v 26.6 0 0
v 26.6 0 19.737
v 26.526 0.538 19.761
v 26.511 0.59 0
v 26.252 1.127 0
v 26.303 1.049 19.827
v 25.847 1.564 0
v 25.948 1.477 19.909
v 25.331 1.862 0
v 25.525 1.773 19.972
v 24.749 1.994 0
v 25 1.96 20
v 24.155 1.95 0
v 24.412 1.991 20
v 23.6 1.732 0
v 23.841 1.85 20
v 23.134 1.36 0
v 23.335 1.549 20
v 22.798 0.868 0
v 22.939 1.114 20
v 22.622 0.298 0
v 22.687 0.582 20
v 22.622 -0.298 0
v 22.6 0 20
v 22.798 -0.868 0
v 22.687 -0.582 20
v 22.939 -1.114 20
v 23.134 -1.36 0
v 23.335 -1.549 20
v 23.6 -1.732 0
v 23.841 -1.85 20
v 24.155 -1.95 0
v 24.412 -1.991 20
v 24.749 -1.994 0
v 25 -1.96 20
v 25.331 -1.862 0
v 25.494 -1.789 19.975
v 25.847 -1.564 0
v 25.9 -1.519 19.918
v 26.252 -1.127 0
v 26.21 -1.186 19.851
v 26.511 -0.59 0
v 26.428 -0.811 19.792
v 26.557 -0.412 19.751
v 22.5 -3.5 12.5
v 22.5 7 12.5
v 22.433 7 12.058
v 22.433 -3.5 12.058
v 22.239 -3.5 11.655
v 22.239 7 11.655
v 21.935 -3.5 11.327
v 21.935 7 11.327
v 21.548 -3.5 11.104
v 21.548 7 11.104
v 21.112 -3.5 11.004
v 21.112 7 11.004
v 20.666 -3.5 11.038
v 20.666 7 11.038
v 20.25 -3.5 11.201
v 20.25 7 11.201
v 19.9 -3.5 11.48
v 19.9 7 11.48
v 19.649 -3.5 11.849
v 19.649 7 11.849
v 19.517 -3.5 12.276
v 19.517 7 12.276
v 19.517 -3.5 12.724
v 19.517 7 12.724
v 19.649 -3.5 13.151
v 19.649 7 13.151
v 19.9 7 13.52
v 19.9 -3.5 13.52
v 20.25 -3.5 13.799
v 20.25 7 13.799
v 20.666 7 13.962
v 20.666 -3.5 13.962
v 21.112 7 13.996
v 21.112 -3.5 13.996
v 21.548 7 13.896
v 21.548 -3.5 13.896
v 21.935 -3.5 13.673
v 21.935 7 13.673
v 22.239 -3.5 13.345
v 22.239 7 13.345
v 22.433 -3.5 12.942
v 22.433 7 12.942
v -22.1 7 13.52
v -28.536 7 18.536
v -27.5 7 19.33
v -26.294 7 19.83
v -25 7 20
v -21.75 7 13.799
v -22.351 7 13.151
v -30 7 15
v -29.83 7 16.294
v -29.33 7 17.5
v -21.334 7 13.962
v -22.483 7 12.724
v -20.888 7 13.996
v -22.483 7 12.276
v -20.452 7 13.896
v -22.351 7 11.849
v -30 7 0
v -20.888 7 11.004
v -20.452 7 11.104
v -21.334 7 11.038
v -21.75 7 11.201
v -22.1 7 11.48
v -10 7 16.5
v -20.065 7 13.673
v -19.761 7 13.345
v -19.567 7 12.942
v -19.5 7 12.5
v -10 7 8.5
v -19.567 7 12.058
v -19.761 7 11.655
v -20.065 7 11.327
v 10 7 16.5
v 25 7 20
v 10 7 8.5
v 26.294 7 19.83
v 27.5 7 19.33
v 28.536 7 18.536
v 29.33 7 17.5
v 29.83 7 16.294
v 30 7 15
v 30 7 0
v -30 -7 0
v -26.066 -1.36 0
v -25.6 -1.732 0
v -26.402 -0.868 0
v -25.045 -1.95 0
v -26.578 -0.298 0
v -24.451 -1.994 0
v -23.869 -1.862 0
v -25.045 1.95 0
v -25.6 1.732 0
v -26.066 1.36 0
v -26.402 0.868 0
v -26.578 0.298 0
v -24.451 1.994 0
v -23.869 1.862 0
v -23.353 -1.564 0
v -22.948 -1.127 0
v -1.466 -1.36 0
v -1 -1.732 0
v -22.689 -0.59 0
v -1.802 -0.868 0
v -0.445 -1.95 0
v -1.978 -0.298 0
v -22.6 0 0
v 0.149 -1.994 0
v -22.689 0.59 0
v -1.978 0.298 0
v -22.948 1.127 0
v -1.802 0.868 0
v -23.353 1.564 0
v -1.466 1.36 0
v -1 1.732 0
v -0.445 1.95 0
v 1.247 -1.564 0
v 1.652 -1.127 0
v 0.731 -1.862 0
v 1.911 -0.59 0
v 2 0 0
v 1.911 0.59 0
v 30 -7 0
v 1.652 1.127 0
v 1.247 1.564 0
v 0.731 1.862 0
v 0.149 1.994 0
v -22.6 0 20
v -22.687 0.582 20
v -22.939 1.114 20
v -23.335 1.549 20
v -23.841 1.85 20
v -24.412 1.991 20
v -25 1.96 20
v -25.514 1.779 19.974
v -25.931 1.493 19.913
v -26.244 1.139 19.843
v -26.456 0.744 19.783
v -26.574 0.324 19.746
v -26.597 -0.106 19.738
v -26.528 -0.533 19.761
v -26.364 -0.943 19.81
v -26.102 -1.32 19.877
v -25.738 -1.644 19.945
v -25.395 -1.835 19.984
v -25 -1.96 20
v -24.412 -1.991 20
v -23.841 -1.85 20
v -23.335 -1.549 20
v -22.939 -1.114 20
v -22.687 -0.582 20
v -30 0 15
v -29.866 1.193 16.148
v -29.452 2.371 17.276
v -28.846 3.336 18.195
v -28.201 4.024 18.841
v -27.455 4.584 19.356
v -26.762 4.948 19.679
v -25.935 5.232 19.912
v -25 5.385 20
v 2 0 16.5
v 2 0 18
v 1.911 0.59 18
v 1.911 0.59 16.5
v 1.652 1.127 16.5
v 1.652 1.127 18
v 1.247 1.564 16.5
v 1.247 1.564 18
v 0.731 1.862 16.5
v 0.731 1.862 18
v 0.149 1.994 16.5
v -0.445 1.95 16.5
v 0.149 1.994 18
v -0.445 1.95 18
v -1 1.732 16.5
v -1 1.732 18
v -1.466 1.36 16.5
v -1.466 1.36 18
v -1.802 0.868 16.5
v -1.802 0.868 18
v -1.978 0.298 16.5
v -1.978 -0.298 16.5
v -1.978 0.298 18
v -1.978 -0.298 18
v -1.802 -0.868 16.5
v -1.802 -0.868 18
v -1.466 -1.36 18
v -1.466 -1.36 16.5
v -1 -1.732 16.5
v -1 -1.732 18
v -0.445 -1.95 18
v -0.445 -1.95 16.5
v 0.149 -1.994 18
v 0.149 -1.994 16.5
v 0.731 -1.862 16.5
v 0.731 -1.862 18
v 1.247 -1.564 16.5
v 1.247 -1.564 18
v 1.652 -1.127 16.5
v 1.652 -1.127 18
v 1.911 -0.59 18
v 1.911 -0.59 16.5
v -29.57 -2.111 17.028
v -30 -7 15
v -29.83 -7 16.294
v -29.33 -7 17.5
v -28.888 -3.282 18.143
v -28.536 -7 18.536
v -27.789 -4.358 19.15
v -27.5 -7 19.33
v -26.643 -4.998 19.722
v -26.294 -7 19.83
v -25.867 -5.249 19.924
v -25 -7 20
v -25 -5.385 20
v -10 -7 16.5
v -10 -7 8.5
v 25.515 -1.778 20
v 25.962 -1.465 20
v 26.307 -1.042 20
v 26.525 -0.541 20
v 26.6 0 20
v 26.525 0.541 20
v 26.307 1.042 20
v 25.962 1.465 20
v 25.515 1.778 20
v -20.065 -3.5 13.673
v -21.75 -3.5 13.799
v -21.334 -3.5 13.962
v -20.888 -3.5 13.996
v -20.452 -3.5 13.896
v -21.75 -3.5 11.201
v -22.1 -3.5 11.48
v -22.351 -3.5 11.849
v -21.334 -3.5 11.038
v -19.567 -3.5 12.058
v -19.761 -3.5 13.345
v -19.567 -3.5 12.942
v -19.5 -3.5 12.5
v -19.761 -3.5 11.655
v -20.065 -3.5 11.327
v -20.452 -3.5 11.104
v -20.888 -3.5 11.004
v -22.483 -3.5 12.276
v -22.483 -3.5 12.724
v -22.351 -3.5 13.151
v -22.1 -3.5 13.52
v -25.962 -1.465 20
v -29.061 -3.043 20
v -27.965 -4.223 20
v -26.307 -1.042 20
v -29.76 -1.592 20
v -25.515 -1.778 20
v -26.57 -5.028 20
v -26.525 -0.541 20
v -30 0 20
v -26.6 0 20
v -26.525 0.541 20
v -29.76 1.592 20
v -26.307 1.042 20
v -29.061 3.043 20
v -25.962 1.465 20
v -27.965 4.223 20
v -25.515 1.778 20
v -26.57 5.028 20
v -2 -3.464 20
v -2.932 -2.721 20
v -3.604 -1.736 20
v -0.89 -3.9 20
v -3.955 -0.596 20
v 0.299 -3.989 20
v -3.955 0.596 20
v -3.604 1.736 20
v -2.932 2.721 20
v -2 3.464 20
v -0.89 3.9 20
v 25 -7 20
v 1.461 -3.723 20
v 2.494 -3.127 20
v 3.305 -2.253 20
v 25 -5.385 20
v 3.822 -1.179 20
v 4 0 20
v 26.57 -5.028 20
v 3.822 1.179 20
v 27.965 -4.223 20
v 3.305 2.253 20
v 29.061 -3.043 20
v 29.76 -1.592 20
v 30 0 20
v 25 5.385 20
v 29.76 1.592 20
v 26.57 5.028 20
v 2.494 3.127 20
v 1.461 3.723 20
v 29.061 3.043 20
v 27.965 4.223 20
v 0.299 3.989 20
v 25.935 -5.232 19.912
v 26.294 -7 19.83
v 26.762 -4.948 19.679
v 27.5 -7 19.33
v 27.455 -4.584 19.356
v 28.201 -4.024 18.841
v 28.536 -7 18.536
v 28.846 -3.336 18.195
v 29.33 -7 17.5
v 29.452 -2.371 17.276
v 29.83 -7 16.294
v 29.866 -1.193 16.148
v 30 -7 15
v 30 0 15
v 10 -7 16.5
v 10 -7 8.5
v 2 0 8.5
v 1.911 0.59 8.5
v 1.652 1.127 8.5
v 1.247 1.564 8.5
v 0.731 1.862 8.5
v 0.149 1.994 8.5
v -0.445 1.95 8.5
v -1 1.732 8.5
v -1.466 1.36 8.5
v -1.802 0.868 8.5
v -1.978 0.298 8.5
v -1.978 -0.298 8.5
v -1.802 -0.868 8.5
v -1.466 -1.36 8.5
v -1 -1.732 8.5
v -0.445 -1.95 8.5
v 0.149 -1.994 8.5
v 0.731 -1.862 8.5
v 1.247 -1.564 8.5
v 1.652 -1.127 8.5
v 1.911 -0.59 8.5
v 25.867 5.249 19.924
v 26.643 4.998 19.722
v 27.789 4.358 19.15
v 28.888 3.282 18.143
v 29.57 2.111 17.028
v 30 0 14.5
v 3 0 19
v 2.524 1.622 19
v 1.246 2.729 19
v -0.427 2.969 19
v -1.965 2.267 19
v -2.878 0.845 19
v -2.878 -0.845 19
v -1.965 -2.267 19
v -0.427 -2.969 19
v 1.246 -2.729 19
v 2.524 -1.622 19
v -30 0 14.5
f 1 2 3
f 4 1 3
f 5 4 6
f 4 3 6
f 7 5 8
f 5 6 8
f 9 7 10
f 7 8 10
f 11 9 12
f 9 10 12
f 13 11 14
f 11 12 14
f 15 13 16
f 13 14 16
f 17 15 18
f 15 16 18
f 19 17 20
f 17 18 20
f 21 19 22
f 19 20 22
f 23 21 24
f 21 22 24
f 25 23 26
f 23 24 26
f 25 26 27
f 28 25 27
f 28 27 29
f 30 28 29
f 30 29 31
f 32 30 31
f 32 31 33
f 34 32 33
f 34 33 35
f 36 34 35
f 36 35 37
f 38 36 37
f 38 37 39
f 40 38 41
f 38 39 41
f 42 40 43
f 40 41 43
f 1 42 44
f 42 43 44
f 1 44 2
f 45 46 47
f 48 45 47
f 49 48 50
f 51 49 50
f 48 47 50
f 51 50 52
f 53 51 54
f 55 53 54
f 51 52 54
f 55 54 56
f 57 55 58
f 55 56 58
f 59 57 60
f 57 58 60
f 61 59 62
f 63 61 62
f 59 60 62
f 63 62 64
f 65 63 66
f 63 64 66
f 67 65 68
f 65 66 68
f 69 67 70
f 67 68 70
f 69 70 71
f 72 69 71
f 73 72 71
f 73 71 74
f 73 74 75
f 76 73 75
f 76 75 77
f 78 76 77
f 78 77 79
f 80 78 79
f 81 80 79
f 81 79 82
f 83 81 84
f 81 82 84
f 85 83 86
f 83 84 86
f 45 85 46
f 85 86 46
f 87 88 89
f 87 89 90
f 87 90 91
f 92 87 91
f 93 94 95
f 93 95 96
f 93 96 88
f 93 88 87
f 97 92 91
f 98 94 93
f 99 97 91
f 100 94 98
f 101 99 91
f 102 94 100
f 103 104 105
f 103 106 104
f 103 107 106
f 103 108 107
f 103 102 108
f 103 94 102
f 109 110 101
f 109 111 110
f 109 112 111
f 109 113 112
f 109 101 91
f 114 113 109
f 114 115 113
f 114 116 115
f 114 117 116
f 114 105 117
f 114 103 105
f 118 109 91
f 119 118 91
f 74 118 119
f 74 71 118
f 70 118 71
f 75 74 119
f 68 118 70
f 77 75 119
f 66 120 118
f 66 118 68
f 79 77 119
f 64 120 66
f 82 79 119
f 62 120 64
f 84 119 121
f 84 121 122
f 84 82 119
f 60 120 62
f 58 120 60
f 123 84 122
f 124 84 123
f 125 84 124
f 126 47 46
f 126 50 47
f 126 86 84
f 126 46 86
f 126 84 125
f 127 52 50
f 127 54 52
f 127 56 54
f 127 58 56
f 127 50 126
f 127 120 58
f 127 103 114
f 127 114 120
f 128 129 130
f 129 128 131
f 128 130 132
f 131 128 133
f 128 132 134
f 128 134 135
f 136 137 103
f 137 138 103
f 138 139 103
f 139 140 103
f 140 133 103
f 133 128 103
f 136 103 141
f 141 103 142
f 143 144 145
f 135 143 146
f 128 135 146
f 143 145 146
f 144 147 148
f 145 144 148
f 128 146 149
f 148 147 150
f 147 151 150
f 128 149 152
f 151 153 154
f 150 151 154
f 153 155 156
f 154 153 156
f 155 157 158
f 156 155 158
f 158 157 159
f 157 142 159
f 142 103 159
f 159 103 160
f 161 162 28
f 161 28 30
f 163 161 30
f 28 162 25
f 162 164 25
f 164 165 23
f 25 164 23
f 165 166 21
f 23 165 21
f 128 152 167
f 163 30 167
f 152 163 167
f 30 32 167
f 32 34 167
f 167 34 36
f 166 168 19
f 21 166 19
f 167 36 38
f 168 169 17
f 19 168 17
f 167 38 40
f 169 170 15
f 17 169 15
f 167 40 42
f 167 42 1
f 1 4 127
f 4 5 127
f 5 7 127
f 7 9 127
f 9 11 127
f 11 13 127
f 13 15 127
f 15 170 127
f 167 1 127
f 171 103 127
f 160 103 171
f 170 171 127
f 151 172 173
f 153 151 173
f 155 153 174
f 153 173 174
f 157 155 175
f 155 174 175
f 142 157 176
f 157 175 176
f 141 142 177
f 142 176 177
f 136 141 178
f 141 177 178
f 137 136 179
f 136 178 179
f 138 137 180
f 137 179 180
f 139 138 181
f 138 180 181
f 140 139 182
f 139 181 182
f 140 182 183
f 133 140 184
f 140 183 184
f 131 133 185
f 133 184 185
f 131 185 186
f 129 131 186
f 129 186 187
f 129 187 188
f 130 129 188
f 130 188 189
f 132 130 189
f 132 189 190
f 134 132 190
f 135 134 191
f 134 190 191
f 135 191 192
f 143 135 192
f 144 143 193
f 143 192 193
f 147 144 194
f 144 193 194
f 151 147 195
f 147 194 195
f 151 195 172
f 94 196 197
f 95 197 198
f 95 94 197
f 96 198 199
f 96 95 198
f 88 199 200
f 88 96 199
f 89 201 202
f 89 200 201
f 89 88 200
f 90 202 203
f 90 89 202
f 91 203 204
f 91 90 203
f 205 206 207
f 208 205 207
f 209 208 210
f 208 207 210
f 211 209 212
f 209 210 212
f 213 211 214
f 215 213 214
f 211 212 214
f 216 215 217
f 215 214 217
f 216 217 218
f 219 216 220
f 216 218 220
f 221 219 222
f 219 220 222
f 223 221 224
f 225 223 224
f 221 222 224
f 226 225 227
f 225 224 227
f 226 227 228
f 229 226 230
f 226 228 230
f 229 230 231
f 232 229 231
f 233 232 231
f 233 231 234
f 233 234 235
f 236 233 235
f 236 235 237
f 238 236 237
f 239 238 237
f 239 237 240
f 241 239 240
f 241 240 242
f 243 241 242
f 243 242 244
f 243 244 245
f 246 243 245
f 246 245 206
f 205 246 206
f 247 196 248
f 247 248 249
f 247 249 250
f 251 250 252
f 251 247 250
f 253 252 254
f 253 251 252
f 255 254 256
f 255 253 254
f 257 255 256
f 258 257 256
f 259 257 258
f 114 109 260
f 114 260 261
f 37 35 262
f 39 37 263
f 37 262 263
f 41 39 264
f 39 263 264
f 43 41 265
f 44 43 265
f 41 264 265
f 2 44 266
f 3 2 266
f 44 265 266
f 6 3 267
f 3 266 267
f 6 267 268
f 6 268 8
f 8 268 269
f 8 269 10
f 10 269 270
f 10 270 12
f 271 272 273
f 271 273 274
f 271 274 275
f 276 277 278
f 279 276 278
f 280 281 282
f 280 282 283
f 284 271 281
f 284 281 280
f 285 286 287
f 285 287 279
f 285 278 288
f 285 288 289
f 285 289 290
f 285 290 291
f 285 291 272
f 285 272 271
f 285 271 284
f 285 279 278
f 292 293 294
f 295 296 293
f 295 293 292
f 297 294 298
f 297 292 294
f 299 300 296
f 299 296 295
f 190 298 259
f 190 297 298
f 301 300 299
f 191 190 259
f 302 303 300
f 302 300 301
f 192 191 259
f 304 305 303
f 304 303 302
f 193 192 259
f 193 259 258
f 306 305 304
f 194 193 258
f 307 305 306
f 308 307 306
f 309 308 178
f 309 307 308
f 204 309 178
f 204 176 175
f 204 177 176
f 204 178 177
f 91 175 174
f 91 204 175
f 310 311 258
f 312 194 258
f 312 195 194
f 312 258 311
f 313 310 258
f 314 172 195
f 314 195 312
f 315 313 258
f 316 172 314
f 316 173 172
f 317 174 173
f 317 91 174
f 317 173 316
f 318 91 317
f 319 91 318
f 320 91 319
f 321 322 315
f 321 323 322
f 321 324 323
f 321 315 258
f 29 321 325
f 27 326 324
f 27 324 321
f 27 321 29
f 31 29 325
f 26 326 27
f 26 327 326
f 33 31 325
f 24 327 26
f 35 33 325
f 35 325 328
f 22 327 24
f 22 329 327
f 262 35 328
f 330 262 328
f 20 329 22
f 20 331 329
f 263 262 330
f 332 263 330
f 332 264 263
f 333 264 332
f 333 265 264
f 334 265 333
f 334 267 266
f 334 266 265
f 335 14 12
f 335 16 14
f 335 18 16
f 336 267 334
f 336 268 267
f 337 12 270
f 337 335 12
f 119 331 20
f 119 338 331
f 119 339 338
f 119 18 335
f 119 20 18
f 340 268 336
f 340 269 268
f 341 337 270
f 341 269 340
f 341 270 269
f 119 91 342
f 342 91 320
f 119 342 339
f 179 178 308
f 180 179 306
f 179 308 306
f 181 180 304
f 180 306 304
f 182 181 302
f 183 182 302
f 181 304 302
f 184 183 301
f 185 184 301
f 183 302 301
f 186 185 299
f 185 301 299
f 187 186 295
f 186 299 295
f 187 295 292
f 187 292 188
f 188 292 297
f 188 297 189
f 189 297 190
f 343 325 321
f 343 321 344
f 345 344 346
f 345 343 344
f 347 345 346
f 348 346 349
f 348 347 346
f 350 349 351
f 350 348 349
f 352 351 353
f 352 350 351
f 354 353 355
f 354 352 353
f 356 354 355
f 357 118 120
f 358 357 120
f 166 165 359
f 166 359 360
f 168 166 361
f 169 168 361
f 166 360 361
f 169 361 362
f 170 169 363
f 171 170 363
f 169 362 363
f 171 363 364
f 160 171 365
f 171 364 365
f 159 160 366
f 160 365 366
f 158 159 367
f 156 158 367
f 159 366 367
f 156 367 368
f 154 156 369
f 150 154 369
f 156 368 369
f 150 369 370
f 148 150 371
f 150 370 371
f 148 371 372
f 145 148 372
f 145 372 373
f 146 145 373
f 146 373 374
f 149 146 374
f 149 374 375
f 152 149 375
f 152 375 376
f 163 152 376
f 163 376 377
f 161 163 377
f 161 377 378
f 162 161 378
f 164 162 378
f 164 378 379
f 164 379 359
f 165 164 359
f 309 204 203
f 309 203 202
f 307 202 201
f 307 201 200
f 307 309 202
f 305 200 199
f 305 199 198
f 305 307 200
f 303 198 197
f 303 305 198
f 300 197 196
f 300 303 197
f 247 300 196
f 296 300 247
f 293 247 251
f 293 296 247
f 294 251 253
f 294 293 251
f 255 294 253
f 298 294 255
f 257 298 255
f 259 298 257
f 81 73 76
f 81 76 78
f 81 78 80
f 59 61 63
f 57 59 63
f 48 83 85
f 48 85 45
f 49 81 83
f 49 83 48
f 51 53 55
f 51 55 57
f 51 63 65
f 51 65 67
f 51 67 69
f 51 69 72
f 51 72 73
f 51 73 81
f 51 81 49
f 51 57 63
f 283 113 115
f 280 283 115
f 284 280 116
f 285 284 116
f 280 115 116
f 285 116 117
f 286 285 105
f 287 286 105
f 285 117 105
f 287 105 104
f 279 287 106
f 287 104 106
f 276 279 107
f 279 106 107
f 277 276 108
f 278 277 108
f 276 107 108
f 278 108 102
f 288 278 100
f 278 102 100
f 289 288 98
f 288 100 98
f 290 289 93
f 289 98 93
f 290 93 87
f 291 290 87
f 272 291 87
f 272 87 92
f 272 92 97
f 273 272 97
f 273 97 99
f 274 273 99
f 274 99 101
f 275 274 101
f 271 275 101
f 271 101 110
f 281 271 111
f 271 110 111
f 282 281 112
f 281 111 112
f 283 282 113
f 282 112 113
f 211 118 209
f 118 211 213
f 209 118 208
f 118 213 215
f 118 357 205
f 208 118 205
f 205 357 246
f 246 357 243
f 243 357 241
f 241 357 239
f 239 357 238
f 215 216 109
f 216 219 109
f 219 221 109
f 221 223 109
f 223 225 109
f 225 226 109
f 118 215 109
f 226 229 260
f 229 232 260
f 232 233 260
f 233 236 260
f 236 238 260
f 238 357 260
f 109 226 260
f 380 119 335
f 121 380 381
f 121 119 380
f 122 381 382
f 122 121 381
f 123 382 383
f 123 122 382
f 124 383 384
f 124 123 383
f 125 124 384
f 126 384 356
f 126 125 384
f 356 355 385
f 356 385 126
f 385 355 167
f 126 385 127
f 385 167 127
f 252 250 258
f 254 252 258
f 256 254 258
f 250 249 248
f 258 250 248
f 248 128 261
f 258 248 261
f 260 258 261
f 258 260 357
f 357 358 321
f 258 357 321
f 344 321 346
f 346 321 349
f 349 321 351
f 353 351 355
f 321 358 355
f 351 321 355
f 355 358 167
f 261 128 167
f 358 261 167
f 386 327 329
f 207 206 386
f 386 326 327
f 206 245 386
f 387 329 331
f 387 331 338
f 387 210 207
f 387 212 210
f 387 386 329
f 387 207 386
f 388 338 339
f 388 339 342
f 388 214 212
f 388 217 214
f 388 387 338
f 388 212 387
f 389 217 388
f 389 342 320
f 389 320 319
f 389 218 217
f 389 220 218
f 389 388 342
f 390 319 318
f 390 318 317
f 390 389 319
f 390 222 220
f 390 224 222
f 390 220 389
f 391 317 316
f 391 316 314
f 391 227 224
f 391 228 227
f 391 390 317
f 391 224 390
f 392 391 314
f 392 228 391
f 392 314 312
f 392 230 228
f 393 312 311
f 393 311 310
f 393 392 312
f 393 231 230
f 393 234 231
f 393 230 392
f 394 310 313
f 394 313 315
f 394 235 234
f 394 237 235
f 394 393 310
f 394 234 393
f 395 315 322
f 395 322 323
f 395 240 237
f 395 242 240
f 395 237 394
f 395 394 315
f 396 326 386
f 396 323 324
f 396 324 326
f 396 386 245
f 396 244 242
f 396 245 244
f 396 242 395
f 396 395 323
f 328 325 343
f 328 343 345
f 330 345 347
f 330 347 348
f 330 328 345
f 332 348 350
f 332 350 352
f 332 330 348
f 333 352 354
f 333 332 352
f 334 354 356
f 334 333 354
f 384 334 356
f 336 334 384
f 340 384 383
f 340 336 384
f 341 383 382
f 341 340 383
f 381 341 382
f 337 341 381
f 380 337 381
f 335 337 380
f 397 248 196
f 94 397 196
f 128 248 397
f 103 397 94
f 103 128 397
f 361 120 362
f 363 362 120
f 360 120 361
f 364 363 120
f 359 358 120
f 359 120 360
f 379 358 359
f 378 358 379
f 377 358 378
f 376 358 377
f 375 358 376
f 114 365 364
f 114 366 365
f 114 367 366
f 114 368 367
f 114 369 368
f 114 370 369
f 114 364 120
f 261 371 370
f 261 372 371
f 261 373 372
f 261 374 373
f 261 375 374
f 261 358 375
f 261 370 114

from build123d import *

# Parameters (mm, degrees)
SKETCH_1_W          = 60
SKETCH_1_H          = 14
EXTRUDE_1_DEPTH     = 20
SKETCH_2_W          = 20
SKETCH_2_H          = 8
CUT_EXTRUDE_1_DEPTH = 15
SKETCH_3_R          = 1.5
CUT_EXTRUDE_2_DEPTH = 10.5
FILLET_1_R          = 5
SKETCH_4_R          = 2
CUT_EXTRUDE_3_DEPTH = 21
CHAMFER_1_SIZE      = 2
SKETCH_5_R          = 5.4
SKETCH_5_R_2        = 2
EXTRUDE_2_DEPTH     = 5.5


with BuildPart() as part:
    # Эскиз1 → Бобышка-Вытянуть1 (new body)
    with BuildSketch(Plane.XY):
        Rectangle(SKETCH_1_W, SKETCH_1_H)
    extrude(amount=EXTRUDE_1_DEPTH)

    # Эскиз2 → Вырез-Вытянуть1 (cut, through all)
    with BuildSketch(Plane(origin=(0, -7, 0), x_dir=(-1, 0, 0), z_dir=(0, -1, 0))):
        with Locations((0, -12.5)):
            Rectangle(SKETCH_2_W, SKETCH_2_H)
    extrude(amount=-CUT_EXTRUDE_1_DEPTH, mode=Mode.SUBTRACT)

    # Эскиз3 → Вырез-Вытянуть2 (cut)
    with BuildSketch(Plane(origin=(0, 7, 0), x_dir=(1, 0, 0), z_dir=(0, 1, 0))):
        with Locations((-21, -12.5)):
            Circle(SKETCH_3_R)
        with Locations((21, -12.5)):
            Circle(SKETCH_3_R)
    extrude(amount=-CUT_EXTRUDE_2_DEPTH, mode=Mode.SUBTRACT)

    # Скругление1
    fillet_1_edges = [part.edges().sort_by_distance(p)[0] for p in [
        (30, 0, 20),
        (-30, 0, 20),
    ]]
    fillet(fillet_1_edges, radius=FILLET_1_R)

    # Эскиз4 → Вырез-Вытянуть3 (cut, through all)
    with BuildSketch(Plane.XY.offset(20)):
        with Locations((24.6, 0)):
            Circle(SKETCH_4_R)
        with Locations((-24.6, 0)):
            Circle(SKETCH_4_R)
        Circle(SKETCH_4_R)
    extrude(amount=-CUT_EXTRUDE_3_DEPTH, mode=Mode.SUBTRACT)

    # Фаска1
    chamfer_1_edges = [part.edges().sort_by_distance(p)[0] for p in [
        (-2, 0, 20),
    ]]
    chamfer(chamfer_1_edges, length=CHAMFER_1_SIZE)

    # Эскиз5 → Бобышка-Вытянуть2 (add)
    with BuildSketch(Plane.XY.offset(20)):
        with Locations((-24.6, 0)):
            Circle(SKETCH_5_R)
        with Locations((-24.6, 0)):
            Circle(SKETCH_5_R_2, mode=Mode.SUBTRACT)
        with Locations((24.6, 0)):
            Circle(SKETCH_5_R)
        with Locations((24.6, 0)):
            Circle(SKETCH_5_R_2, mode=Mode.SUBTRACT)
    extrude(amount=-EXTRUDE_2_DEPTH)


solid = part.part
